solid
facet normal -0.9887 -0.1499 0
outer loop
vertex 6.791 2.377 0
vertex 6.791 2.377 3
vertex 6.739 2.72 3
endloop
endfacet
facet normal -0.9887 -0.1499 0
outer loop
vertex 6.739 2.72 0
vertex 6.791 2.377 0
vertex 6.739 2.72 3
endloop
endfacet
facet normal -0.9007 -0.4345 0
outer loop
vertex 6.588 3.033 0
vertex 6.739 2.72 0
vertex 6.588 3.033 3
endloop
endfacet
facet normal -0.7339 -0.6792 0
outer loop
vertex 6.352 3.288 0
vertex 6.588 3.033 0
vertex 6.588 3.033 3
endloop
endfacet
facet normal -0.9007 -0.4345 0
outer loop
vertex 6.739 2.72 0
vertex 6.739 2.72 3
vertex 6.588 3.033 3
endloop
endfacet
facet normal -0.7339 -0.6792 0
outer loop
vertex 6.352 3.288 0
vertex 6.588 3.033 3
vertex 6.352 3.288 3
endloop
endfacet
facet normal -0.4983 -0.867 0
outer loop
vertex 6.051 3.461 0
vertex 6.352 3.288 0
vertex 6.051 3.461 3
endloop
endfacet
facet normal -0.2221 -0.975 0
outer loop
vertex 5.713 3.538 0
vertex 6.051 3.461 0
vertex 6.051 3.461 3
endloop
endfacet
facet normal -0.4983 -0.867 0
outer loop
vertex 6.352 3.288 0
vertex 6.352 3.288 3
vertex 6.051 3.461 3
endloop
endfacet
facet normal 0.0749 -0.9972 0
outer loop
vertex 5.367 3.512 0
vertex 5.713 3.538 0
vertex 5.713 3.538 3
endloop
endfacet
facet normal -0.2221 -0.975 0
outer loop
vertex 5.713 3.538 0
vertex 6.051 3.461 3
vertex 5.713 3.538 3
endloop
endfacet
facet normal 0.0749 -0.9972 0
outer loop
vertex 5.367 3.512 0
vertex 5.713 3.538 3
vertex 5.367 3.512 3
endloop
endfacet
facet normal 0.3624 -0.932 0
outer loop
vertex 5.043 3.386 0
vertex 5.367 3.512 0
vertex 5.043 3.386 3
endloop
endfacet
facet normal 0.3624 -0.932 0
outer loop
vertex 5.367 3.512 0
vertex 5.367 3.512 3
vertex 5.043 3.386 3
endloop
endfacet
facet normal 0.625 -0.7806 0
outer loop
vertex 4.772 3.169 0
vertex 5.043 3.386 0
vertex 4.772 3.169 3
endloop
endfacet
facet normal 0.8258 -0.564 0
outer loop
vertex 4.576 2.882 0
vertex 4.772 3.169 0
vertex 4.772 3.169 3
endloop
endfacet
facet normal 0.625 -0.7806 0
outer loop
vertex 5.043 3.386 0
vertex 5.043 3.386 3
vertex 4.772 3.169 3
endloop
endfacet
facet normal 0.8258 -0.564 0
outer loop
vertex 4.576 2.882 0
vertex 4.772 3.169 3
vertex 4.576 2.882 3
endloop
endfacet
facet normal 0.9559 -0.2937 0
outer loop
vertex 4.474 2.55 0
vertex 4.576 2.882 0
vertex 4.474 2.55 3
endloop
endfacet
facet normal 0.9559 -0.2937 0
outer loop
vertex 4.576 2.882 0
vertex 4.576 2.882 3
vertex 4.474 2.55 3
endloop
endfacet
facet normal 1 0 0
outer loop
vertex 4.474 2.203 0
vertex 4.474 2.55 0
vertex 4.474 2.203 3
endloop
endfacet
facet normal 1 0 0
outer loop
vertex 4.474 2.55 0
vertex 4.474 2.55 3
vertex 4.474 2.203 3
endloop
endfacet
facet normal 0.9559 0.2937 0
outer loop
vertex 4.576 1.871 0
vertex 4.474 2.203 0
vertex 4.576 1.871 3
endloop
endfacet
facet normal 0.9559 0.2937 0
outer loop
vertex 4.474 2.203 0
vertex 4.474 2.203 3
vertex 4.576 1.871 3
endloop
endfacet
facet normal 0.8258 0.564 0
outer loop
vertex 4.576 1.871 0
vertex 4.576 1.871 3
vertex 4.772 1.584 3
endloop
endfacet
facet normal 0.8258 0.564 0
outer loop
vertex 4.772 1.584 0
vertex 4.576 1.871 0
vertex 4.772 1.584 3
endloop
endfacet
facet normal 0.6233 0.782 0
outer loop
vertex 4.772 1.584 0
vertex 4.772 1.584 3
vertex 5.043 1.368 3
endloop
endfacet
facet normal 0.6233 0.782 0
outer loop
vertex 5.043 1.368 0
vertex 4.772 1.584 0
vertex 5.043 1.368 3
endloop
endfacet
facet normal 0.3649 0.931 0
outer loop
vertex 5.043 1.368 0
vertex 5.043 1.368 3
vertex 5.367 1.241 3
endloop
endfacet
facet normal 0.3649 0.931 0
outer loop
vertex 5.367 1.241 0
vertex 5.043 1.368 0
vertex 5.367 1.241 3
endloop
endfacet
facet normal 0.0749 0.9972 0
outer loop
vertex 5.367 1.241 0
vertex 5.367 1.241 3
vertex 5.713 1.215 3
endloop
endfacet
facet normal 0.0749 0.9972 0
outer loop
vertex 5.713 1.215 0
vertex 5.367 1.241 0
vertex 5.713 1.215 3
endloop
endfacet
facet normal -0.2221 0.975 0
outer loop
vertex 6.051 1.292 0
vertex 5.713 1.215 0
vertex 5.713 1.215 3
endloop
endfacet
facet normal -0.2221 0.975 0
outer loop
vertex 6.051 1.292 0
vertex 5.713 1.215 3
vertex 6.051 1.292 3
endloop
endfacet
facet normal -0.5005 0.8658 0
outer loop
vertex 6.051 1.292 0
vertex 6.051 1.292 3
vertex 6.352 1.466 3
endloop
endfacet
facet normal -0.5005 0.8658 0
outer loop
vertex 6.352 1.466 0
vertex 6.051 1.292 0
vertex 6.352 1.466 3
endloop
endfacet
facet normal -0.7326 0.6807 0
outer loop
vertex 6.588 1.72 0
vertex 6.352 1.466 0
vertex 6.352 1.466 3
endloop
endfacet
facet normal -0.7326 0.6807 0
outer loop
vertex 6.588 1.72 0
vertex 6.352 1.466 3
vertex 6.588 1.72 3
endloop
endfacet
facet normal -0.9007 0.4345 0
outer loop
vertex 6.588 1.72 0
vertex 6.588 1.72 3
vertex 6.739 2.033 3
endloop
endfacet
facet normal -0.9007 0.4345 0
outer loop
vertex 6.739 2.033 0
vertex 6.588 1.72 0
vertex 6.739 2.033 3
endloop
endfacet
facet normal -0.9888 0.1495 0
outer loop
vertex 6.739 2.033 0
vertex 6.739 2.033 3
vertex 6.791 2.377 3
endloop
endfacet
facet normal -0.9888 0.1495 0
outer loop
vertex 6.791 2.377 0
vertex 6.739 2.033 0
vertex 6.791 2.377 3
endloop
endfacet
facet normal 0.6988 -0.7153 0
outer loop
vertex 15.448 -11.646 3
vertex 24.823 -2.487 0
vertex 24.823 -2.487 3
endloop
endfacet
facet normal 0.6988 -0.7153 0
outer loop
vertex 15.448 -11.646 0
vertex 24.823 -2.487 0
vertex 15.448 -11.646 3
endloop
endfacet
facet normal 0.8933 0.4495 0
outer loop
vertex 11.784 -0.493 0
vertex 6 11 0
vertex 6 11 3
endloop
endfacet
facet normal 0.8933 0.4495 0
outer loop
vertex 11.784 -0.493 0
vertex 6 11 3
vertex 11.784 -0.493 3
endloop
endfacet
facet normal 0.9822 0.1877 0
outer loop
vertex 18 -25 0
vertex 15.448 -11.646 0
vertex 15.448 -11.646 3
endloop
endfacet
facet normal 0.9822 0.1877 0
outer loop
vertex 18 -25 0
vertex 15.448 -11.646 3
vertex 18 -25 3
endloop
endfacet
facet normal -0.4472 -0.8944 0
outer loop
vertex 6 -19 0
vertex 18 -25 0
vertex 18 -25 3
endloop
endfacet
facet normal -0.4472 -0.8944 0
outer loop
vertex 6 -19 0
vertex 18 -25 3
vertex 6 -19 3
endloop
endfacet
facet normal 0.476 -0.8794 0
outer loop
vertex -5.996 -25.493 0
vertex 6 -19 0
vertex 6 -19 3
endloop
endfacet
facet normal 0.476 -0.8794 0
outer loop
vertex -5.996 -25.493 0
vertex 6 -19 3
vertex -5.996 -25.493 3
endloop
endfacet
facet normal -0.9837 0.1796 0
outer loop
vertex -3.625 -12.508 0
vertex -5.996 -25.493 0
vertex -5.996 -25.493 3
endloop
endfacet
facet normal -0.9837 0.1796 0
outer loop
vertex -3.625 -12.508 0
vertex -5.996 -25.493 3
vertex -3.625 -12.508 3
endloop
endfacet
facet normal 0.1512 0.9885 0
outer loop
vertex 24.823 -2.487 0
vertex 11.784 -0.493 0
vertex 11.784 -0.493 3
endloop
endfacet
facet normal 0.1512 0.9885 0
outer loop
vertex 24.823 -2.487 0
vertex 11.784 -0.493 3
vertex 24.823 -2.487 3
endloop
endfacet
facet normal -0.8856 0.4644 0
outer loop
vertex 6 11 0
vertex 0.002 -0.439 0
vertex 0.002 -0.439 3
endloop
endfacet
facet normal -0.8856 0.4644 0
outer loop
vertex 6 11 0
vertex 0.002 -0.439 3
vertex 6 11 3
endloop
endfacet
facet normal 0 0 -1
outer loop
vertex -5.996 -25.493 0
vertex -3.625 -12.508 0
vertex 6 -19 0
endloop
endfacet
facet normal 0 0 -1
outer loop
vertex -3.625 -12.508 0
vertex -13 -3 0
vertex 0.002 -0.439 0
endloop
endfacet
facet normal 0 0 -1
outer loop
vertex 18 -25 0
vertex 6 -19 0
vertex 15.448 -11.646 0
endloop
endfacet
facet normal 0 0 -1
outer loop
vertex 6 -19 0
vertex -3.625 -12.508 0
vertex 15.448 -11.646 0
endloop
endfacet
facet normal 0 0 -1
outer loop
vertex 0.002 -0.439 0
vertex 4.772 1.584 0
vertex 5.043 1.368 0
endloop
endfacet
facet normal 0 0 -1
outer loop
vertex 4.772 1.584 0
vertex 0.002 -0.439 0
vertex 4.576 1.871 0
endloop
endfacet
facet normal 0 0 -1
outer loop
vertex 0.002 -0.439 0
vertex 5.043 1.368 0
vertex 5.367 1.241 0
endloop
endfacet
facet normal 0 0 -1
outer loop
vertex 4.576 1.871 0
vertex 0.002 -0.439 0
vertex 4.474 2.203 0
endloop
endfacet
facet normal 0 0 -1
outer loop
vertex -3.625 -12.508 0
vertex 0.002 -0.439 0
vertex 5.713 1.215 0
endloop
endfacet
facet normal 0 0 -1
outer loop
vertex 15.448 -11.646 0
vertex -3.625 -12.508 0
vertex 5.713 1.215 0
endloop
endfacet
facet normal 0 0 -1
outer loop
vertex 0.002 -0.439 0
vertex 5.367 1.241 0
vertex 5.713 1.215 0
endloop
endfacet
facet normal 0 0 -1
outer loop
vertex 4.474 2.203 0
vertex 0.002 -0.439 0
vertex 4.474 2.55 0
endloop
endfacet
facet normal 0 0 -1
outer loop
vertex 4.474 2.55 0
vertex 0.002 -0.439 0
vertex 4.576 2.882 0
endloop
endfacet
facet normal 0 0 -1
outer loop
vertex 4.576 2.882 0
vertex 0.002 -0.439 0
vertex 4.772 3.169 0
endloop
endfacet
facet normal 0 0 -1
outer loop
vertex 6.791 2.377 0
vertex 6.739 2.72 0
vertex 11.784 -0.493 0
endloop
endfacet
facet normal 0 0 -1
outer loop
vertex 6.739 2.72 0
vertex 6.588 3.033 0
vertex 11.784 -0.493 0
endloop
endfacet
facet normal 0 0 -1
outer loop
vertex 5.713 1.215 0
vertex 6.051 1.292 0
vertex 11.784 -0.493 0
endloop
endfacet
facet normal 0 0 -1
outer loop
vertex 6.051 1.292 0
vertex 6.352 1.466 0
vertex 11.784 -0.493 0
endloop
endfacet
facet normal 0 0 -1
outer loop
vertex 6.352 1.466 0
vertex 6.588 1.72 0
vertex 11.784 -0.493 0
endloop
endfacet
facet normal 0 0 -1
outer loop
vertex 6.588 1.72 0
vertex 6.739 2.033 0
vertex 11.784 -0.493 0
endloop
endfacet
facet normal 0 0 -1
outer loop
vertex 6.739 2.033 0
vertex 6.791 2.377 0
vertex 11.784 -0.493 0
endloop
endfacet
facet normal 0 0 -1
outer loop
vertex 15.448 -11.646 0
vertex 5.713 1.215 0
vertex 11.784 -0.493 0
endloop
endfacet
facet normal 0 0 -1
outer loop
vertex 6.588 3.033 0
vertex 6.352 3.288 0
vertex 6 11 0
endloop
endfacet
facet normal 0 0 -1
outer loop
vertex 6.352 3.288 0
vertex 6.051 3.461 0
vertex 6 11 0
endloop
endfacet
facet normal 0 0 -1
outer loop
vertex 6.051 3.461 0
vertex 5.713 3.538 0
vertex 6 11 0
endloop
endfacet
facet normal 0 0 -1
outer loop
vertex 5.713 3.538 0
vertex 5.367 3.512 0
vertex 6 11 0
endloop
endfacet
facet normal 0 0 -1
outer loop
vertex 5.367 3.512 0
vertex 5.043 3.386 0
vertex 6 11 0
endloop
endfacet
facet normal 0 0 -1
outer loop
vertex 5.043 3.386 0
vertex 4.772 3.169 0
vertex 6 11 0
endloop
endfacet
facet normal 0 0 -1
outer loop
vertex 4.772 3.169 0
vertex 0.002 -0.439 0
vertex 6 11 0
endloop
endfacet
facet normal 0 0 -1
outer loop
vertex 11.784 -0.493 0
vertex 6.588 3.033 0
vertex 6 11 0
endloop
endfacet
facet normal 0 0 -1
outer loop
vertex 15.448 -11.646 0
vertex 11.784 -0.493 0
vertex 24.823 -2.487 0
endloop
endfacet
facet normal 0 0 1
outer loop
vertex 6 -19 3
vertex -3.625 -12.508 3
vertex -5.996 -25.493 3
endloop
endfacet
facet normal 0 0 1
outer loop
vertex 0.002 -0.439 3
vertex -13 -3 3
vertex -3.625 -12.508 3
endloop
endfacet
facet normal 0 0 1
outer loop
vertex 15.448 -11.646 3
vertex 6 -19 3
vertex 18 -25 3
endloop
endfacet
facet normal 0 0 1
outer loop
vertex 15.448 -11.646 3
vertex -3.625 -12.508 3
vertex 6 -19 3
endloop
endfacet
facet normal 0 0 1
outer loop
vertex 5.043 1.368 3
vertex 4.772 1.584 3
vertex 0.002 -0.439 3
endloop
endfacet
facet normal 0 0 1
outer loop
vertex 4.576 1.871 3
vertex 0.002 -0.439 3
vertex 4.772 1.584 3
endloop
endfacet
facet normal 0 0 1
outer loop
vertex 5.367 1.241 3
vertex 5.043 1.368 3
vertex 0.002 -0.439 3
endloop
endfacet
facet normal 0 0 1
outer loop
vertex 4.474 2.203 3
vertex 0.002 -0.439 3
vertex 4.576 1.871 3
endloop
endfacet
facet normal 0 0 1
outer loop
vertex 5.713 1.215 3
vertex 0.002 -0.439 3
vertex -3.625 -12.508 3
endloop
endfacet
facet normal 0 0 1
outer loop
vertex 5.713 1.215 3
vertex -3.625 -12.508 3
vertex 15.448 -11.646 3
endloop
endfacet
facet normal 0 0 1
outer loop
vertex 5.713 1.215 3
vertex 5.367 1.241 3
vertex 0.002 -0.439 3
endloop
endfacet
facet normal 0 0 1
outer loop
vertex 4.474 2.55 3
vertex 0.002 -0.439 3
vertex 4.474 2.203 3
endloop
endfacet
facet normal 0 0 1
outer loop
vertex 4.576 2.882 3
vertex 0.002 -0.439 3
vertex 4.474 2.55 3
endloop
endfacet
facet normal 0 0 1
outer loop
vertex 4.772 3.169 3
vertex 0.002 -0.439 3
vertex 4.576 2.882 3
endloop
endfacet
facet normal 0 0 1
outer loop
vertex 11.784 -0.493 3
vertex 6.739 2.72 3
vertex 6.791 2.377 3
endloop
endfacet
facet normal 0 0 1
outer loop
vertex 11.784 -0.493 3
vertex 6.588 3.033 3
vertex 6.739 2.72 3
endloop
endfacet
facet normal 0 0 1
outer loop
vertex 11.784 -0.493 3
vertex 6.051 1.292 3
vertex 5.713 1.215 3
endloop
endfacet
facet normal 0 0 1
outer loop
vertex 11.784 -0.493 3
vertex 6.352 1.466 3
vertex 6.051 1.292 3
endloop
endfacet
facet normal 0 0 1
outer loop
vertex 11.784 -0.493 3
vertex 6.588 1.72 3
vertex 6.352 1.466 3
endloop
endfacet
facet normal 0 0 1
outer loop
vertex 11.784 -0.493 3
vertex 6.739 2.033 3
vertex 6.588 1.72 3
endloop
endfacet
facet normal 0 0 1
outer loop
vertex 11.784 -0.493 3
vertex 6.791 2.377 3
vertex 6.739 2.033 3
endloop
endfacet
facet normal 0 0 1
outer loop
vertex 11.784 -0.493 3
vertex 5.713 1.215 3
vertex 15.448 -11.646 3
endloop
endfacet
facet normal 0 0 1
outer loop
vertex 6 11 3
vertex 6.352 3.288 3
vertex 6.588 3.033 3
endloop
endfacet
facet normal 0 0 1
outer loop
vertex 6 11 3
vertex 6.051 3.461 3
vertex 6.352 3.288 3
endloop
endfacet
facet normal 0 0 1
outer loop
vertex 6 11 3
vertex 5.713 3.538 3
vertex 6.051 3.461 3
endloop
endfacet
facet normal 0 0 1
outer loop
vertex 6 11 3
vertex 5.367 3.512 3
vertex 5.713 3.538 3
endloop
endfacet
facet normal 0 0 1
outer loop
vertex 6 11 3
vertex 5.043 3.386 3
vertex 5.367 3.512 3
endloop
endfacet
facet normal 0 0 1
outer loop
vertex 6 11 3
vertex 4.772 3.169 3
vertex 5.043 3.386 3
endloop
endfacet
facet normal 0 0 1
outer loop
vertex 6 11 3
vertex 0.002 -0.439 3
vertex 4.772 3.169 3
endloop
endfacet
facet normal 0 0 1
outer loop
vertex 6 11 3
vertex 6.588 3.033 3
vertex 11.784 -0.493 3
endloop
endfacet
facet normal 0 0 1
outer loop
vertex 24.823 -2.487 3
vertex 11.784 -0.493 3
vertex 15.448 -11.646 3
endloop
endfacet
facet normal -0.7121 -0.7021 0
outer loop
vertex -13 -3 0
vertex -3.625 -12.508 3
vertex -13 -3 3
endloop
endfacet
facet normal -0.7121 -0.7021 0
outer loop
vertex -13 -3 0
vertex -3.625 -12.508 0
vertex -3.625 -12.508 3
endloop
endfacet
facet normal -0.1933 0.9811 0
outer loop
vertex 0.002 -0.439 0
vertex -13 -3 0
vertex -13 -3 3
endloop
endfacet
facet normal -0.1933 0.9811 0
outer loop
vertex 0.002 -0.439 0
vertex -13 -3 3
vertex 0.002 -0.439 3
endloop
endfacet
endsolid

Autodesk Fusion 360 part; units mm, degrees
sketch "Sketch4" plane through (0, 0, 0) normal (0, 0, 1) x (1, 0, 0)
  line L0 (-14, 13) -> (26, 13)
  line L1 (26, 13) -> (26, -27)
  line L2 (26, -27) -> (-14, -27)
  line L3 (-14, -27) -> (-14, 13)
  line L4 (6, 11) -> (11.7842, -0.4932)
  line L5 (11.7842, -0.4932) -> (24.8229, -2.4867)
  line L6 (24.8229, -2.4867) -> (15.448, -11.6461)
  line L7 (15.448, -11.6461) -> (18, -25)
  line L8 (18, -25) -> (6, -19)
  line L9 (6, -19) -> (-5.9959, -25.493)
  line L10 (-5.9959, -25.493) -> (-3.6252, -12.5082)
  line L11 (-3.6252, -12.5082) -> (-13, -3)
  line L12 (-13, -3) -> (0.0021, -0.4393)
  line L13 (0.0021, -0.4393) -> (6, 11)
extrude "Extrude1" add sketch "Sketch4" along normal blind 3 contours L4 L5 L6 L7 L8 L9 L10 L11 L12 L13
cylinder "CylinderPrimitive1" cut diameter 2.33 height -3 placed x (1, 0, 0) y (0, 1, 0) z (0, 0, 1) at (5.6258, 2.3767, 3)
sketch "Sketch2" plane through (0, 0, 0) normal (0, 0, 1) x (1, 0, 0)
  line L0 (-22.5492, 19.9652) -> (17.4508, 19.9652)
  line L1 (17.4508, 19.9652) -> (17.4508, -20.0348)
  line L2 (17.4508, -20.0348) -> (-22.5492, -20.0348)
  line L3 (-22.5492, -20.0348) -> (-22.5492, 19.9652)
